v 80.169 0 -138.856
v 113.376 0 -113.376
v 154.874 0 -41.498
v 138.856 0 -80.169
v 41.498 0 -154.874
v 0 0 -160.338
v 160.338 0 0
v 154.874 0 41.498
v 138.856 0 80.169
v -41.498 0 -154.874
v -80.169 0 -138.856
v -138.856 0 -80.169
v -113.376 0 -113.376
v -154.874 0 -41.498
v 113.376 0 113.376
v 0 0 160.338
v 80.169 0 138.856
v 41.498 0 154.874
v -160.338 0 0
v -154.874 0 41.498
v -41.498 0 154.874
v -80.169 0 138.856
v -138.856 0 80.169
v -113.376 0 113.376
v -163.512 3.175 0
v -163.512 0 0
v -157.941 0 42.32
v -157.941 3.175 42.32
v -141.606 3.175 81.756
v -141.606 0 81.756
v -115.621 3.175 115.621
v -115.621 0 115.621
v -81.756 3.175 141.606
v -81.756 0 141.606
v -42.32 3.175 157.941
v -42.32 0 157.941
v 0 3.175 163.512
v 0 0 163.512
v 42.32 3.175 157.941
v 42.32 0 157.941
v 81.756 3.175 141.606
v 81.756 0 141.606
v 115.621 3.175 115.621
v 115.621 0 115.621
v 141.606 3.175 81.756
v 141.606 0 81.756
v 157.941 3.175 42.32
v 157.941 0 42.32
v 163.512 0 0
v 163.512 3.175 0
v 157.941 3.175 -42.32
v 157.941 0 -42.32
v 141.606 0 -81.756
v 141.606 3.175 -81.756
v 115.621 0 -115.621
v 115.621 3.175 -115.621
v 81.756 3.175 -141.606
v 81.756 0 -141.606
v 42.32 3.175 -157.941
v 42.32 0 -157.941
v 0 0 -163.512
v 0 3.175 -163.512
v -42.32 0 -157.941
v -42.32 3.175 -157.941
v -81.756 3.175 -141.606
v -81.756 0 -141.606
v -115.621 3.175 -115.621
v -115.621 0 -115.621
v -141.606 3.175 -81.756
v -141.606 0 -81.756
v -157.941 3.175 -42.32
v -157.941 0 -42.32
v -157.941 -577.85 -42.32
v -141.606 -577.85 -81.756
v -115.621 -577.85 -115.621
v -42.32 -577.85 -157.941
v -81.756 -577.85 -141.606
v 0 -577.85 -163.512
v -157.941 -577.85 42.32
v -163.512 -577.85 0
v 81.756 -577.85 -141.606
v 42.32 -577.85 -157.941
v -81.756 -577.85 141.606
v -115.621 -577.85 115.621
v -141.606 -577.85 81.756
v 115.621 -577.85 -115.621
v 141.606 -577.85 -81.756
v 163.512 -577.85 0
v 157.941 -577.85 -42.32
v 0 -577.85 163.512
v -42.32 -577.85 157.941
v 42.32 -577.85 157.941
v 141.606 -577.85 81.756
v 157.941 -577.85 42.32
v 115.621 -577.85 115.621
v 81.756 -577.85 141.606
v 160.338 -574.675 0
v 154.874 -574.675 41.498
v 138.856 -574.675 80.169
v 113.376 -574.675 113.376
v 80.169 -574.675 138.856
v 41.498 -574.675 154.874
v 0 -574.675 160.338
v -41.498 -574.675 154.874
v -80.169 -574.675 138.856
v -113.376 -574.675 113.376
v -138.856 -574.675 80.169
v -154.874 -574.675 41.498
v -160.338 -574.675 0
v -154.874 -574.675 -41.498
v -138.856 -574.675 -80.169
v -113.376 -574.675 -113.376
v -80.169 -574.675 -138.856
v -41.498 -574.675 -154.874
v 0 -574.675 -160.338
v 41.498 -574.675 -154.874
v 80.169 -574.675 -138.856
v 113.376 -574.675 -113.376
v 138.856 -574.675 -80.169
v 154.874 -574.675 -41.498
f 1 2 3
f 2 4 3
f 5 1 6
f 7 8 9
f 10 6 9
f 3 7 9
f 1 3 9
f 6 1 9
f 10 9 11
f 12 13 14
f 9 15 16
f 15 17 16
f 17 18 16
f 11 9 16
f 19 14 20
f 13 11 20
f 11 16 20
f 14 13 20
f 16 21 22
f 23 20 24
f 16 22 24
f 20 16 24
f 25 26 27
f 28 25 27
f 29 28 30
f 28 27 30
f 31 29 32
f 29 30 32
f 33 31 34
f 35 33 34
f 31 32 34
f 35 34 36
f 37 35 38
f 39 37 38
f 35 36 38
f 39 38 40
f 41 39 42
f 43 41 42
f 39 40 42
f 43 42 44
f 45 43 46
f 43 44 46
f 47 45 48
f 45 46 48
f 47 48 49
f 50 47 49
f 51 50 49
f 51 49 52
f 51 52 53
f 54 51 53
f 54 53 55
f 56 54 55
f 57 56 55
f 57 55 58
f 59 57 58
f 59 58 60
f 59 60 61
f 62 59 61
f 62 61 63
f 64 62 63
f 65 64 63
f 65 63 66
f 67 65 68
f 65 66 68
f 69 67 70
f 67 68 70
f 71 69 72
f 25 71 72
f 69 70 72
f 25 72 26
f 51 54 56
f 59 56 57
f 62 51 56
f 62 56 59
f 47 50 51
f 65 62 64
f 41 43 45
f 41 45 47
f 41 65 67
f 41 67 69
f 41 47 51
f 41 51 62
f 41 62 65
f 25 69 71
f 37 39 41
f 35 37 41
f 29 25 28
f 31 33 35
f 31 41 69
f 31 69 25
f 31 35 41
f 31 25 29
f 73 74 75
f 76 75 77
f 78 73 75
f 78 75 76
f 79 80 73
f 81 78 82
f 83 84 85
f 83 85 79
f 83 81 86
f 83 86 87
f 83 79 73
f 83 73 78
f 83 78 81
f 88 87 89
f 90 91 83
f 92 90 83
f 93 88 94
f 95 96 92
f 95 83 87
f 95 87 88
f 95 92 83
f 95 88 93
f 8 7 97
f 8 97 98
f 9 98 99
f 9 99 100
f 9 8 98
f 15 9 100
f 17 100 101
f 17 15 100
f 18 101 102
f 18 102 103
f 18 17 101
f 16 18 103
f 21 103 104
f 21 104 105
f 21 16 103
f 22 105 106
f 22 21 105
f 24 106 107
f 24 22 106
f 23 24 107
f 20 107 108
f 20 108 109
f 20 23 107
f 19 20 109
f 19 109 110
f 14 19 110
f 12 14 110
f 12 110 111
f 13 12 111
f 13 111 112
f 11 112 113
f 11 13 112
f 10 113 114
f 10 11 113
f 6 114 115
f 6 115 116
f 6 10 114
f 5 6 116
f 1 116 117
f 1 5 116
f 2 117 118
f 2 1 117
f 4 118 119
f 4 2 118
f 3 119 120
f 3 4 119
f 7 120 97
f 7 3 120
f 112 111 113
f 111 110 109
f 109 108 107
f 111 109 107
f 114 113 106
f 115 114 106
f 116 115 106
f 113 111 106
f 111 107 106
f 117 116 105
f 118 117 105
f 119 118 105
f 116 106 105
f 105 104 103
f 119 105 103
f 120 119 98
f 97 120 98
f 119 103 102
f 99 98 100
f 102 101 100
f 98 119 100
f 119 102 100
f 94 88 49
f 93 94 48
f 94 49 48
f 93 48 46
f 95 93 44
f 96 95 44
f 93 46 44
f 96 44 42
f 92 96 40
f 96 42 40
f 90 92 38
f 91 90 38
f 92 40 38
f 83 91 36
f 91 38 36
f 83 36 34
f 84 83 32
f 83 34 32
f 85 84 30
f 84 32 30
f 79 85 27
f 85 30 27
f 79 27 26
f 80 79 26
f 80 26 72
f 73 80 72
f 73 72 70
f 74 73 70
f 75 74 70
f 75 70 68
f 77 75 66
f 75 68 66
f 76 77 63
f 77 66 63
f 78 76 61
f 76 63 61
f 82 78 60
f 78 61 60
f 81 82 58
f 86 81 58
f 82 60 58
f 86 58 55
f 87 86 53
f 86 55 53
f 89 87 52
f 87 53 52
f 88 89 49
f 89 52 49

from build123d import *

# Parameters (mm, degrees)
F0_R     = 163.5125
F0_R_2   = 160.3375
F1_DEPTH = 574.675
F2_R     = 163.5125
F3_DEPTH = 3.175
F4_R     = 163.5125
F5_DEPTH = 3.175


with BuildPart() as f1:
    # F0 (on Front) → F1 (new body)
    with BuildSketch(Plane.XZ):
        Circle(F0_R)
        Circle(F0_R_2, mode=Mode.SUBTRACT)
    extrude(amount=F1_DEPTH)

    # F2 (on face) → F3 (join)
    with BuildSketch(Plane.XZ.offset(574.675)):
        Circle(F2_R)
    extrude(amount=F3_DEPTH)

    # F4 (on face) → F5 (join)
    with BuildSketch(Plane(origin=(0, 0, 0), x_dir=(-1, 0, 0), z_dir=(0, 1, 0))):
        Circle(F4_R)
    extrude(amount=F5_DEPTH)


solid = f1.part
